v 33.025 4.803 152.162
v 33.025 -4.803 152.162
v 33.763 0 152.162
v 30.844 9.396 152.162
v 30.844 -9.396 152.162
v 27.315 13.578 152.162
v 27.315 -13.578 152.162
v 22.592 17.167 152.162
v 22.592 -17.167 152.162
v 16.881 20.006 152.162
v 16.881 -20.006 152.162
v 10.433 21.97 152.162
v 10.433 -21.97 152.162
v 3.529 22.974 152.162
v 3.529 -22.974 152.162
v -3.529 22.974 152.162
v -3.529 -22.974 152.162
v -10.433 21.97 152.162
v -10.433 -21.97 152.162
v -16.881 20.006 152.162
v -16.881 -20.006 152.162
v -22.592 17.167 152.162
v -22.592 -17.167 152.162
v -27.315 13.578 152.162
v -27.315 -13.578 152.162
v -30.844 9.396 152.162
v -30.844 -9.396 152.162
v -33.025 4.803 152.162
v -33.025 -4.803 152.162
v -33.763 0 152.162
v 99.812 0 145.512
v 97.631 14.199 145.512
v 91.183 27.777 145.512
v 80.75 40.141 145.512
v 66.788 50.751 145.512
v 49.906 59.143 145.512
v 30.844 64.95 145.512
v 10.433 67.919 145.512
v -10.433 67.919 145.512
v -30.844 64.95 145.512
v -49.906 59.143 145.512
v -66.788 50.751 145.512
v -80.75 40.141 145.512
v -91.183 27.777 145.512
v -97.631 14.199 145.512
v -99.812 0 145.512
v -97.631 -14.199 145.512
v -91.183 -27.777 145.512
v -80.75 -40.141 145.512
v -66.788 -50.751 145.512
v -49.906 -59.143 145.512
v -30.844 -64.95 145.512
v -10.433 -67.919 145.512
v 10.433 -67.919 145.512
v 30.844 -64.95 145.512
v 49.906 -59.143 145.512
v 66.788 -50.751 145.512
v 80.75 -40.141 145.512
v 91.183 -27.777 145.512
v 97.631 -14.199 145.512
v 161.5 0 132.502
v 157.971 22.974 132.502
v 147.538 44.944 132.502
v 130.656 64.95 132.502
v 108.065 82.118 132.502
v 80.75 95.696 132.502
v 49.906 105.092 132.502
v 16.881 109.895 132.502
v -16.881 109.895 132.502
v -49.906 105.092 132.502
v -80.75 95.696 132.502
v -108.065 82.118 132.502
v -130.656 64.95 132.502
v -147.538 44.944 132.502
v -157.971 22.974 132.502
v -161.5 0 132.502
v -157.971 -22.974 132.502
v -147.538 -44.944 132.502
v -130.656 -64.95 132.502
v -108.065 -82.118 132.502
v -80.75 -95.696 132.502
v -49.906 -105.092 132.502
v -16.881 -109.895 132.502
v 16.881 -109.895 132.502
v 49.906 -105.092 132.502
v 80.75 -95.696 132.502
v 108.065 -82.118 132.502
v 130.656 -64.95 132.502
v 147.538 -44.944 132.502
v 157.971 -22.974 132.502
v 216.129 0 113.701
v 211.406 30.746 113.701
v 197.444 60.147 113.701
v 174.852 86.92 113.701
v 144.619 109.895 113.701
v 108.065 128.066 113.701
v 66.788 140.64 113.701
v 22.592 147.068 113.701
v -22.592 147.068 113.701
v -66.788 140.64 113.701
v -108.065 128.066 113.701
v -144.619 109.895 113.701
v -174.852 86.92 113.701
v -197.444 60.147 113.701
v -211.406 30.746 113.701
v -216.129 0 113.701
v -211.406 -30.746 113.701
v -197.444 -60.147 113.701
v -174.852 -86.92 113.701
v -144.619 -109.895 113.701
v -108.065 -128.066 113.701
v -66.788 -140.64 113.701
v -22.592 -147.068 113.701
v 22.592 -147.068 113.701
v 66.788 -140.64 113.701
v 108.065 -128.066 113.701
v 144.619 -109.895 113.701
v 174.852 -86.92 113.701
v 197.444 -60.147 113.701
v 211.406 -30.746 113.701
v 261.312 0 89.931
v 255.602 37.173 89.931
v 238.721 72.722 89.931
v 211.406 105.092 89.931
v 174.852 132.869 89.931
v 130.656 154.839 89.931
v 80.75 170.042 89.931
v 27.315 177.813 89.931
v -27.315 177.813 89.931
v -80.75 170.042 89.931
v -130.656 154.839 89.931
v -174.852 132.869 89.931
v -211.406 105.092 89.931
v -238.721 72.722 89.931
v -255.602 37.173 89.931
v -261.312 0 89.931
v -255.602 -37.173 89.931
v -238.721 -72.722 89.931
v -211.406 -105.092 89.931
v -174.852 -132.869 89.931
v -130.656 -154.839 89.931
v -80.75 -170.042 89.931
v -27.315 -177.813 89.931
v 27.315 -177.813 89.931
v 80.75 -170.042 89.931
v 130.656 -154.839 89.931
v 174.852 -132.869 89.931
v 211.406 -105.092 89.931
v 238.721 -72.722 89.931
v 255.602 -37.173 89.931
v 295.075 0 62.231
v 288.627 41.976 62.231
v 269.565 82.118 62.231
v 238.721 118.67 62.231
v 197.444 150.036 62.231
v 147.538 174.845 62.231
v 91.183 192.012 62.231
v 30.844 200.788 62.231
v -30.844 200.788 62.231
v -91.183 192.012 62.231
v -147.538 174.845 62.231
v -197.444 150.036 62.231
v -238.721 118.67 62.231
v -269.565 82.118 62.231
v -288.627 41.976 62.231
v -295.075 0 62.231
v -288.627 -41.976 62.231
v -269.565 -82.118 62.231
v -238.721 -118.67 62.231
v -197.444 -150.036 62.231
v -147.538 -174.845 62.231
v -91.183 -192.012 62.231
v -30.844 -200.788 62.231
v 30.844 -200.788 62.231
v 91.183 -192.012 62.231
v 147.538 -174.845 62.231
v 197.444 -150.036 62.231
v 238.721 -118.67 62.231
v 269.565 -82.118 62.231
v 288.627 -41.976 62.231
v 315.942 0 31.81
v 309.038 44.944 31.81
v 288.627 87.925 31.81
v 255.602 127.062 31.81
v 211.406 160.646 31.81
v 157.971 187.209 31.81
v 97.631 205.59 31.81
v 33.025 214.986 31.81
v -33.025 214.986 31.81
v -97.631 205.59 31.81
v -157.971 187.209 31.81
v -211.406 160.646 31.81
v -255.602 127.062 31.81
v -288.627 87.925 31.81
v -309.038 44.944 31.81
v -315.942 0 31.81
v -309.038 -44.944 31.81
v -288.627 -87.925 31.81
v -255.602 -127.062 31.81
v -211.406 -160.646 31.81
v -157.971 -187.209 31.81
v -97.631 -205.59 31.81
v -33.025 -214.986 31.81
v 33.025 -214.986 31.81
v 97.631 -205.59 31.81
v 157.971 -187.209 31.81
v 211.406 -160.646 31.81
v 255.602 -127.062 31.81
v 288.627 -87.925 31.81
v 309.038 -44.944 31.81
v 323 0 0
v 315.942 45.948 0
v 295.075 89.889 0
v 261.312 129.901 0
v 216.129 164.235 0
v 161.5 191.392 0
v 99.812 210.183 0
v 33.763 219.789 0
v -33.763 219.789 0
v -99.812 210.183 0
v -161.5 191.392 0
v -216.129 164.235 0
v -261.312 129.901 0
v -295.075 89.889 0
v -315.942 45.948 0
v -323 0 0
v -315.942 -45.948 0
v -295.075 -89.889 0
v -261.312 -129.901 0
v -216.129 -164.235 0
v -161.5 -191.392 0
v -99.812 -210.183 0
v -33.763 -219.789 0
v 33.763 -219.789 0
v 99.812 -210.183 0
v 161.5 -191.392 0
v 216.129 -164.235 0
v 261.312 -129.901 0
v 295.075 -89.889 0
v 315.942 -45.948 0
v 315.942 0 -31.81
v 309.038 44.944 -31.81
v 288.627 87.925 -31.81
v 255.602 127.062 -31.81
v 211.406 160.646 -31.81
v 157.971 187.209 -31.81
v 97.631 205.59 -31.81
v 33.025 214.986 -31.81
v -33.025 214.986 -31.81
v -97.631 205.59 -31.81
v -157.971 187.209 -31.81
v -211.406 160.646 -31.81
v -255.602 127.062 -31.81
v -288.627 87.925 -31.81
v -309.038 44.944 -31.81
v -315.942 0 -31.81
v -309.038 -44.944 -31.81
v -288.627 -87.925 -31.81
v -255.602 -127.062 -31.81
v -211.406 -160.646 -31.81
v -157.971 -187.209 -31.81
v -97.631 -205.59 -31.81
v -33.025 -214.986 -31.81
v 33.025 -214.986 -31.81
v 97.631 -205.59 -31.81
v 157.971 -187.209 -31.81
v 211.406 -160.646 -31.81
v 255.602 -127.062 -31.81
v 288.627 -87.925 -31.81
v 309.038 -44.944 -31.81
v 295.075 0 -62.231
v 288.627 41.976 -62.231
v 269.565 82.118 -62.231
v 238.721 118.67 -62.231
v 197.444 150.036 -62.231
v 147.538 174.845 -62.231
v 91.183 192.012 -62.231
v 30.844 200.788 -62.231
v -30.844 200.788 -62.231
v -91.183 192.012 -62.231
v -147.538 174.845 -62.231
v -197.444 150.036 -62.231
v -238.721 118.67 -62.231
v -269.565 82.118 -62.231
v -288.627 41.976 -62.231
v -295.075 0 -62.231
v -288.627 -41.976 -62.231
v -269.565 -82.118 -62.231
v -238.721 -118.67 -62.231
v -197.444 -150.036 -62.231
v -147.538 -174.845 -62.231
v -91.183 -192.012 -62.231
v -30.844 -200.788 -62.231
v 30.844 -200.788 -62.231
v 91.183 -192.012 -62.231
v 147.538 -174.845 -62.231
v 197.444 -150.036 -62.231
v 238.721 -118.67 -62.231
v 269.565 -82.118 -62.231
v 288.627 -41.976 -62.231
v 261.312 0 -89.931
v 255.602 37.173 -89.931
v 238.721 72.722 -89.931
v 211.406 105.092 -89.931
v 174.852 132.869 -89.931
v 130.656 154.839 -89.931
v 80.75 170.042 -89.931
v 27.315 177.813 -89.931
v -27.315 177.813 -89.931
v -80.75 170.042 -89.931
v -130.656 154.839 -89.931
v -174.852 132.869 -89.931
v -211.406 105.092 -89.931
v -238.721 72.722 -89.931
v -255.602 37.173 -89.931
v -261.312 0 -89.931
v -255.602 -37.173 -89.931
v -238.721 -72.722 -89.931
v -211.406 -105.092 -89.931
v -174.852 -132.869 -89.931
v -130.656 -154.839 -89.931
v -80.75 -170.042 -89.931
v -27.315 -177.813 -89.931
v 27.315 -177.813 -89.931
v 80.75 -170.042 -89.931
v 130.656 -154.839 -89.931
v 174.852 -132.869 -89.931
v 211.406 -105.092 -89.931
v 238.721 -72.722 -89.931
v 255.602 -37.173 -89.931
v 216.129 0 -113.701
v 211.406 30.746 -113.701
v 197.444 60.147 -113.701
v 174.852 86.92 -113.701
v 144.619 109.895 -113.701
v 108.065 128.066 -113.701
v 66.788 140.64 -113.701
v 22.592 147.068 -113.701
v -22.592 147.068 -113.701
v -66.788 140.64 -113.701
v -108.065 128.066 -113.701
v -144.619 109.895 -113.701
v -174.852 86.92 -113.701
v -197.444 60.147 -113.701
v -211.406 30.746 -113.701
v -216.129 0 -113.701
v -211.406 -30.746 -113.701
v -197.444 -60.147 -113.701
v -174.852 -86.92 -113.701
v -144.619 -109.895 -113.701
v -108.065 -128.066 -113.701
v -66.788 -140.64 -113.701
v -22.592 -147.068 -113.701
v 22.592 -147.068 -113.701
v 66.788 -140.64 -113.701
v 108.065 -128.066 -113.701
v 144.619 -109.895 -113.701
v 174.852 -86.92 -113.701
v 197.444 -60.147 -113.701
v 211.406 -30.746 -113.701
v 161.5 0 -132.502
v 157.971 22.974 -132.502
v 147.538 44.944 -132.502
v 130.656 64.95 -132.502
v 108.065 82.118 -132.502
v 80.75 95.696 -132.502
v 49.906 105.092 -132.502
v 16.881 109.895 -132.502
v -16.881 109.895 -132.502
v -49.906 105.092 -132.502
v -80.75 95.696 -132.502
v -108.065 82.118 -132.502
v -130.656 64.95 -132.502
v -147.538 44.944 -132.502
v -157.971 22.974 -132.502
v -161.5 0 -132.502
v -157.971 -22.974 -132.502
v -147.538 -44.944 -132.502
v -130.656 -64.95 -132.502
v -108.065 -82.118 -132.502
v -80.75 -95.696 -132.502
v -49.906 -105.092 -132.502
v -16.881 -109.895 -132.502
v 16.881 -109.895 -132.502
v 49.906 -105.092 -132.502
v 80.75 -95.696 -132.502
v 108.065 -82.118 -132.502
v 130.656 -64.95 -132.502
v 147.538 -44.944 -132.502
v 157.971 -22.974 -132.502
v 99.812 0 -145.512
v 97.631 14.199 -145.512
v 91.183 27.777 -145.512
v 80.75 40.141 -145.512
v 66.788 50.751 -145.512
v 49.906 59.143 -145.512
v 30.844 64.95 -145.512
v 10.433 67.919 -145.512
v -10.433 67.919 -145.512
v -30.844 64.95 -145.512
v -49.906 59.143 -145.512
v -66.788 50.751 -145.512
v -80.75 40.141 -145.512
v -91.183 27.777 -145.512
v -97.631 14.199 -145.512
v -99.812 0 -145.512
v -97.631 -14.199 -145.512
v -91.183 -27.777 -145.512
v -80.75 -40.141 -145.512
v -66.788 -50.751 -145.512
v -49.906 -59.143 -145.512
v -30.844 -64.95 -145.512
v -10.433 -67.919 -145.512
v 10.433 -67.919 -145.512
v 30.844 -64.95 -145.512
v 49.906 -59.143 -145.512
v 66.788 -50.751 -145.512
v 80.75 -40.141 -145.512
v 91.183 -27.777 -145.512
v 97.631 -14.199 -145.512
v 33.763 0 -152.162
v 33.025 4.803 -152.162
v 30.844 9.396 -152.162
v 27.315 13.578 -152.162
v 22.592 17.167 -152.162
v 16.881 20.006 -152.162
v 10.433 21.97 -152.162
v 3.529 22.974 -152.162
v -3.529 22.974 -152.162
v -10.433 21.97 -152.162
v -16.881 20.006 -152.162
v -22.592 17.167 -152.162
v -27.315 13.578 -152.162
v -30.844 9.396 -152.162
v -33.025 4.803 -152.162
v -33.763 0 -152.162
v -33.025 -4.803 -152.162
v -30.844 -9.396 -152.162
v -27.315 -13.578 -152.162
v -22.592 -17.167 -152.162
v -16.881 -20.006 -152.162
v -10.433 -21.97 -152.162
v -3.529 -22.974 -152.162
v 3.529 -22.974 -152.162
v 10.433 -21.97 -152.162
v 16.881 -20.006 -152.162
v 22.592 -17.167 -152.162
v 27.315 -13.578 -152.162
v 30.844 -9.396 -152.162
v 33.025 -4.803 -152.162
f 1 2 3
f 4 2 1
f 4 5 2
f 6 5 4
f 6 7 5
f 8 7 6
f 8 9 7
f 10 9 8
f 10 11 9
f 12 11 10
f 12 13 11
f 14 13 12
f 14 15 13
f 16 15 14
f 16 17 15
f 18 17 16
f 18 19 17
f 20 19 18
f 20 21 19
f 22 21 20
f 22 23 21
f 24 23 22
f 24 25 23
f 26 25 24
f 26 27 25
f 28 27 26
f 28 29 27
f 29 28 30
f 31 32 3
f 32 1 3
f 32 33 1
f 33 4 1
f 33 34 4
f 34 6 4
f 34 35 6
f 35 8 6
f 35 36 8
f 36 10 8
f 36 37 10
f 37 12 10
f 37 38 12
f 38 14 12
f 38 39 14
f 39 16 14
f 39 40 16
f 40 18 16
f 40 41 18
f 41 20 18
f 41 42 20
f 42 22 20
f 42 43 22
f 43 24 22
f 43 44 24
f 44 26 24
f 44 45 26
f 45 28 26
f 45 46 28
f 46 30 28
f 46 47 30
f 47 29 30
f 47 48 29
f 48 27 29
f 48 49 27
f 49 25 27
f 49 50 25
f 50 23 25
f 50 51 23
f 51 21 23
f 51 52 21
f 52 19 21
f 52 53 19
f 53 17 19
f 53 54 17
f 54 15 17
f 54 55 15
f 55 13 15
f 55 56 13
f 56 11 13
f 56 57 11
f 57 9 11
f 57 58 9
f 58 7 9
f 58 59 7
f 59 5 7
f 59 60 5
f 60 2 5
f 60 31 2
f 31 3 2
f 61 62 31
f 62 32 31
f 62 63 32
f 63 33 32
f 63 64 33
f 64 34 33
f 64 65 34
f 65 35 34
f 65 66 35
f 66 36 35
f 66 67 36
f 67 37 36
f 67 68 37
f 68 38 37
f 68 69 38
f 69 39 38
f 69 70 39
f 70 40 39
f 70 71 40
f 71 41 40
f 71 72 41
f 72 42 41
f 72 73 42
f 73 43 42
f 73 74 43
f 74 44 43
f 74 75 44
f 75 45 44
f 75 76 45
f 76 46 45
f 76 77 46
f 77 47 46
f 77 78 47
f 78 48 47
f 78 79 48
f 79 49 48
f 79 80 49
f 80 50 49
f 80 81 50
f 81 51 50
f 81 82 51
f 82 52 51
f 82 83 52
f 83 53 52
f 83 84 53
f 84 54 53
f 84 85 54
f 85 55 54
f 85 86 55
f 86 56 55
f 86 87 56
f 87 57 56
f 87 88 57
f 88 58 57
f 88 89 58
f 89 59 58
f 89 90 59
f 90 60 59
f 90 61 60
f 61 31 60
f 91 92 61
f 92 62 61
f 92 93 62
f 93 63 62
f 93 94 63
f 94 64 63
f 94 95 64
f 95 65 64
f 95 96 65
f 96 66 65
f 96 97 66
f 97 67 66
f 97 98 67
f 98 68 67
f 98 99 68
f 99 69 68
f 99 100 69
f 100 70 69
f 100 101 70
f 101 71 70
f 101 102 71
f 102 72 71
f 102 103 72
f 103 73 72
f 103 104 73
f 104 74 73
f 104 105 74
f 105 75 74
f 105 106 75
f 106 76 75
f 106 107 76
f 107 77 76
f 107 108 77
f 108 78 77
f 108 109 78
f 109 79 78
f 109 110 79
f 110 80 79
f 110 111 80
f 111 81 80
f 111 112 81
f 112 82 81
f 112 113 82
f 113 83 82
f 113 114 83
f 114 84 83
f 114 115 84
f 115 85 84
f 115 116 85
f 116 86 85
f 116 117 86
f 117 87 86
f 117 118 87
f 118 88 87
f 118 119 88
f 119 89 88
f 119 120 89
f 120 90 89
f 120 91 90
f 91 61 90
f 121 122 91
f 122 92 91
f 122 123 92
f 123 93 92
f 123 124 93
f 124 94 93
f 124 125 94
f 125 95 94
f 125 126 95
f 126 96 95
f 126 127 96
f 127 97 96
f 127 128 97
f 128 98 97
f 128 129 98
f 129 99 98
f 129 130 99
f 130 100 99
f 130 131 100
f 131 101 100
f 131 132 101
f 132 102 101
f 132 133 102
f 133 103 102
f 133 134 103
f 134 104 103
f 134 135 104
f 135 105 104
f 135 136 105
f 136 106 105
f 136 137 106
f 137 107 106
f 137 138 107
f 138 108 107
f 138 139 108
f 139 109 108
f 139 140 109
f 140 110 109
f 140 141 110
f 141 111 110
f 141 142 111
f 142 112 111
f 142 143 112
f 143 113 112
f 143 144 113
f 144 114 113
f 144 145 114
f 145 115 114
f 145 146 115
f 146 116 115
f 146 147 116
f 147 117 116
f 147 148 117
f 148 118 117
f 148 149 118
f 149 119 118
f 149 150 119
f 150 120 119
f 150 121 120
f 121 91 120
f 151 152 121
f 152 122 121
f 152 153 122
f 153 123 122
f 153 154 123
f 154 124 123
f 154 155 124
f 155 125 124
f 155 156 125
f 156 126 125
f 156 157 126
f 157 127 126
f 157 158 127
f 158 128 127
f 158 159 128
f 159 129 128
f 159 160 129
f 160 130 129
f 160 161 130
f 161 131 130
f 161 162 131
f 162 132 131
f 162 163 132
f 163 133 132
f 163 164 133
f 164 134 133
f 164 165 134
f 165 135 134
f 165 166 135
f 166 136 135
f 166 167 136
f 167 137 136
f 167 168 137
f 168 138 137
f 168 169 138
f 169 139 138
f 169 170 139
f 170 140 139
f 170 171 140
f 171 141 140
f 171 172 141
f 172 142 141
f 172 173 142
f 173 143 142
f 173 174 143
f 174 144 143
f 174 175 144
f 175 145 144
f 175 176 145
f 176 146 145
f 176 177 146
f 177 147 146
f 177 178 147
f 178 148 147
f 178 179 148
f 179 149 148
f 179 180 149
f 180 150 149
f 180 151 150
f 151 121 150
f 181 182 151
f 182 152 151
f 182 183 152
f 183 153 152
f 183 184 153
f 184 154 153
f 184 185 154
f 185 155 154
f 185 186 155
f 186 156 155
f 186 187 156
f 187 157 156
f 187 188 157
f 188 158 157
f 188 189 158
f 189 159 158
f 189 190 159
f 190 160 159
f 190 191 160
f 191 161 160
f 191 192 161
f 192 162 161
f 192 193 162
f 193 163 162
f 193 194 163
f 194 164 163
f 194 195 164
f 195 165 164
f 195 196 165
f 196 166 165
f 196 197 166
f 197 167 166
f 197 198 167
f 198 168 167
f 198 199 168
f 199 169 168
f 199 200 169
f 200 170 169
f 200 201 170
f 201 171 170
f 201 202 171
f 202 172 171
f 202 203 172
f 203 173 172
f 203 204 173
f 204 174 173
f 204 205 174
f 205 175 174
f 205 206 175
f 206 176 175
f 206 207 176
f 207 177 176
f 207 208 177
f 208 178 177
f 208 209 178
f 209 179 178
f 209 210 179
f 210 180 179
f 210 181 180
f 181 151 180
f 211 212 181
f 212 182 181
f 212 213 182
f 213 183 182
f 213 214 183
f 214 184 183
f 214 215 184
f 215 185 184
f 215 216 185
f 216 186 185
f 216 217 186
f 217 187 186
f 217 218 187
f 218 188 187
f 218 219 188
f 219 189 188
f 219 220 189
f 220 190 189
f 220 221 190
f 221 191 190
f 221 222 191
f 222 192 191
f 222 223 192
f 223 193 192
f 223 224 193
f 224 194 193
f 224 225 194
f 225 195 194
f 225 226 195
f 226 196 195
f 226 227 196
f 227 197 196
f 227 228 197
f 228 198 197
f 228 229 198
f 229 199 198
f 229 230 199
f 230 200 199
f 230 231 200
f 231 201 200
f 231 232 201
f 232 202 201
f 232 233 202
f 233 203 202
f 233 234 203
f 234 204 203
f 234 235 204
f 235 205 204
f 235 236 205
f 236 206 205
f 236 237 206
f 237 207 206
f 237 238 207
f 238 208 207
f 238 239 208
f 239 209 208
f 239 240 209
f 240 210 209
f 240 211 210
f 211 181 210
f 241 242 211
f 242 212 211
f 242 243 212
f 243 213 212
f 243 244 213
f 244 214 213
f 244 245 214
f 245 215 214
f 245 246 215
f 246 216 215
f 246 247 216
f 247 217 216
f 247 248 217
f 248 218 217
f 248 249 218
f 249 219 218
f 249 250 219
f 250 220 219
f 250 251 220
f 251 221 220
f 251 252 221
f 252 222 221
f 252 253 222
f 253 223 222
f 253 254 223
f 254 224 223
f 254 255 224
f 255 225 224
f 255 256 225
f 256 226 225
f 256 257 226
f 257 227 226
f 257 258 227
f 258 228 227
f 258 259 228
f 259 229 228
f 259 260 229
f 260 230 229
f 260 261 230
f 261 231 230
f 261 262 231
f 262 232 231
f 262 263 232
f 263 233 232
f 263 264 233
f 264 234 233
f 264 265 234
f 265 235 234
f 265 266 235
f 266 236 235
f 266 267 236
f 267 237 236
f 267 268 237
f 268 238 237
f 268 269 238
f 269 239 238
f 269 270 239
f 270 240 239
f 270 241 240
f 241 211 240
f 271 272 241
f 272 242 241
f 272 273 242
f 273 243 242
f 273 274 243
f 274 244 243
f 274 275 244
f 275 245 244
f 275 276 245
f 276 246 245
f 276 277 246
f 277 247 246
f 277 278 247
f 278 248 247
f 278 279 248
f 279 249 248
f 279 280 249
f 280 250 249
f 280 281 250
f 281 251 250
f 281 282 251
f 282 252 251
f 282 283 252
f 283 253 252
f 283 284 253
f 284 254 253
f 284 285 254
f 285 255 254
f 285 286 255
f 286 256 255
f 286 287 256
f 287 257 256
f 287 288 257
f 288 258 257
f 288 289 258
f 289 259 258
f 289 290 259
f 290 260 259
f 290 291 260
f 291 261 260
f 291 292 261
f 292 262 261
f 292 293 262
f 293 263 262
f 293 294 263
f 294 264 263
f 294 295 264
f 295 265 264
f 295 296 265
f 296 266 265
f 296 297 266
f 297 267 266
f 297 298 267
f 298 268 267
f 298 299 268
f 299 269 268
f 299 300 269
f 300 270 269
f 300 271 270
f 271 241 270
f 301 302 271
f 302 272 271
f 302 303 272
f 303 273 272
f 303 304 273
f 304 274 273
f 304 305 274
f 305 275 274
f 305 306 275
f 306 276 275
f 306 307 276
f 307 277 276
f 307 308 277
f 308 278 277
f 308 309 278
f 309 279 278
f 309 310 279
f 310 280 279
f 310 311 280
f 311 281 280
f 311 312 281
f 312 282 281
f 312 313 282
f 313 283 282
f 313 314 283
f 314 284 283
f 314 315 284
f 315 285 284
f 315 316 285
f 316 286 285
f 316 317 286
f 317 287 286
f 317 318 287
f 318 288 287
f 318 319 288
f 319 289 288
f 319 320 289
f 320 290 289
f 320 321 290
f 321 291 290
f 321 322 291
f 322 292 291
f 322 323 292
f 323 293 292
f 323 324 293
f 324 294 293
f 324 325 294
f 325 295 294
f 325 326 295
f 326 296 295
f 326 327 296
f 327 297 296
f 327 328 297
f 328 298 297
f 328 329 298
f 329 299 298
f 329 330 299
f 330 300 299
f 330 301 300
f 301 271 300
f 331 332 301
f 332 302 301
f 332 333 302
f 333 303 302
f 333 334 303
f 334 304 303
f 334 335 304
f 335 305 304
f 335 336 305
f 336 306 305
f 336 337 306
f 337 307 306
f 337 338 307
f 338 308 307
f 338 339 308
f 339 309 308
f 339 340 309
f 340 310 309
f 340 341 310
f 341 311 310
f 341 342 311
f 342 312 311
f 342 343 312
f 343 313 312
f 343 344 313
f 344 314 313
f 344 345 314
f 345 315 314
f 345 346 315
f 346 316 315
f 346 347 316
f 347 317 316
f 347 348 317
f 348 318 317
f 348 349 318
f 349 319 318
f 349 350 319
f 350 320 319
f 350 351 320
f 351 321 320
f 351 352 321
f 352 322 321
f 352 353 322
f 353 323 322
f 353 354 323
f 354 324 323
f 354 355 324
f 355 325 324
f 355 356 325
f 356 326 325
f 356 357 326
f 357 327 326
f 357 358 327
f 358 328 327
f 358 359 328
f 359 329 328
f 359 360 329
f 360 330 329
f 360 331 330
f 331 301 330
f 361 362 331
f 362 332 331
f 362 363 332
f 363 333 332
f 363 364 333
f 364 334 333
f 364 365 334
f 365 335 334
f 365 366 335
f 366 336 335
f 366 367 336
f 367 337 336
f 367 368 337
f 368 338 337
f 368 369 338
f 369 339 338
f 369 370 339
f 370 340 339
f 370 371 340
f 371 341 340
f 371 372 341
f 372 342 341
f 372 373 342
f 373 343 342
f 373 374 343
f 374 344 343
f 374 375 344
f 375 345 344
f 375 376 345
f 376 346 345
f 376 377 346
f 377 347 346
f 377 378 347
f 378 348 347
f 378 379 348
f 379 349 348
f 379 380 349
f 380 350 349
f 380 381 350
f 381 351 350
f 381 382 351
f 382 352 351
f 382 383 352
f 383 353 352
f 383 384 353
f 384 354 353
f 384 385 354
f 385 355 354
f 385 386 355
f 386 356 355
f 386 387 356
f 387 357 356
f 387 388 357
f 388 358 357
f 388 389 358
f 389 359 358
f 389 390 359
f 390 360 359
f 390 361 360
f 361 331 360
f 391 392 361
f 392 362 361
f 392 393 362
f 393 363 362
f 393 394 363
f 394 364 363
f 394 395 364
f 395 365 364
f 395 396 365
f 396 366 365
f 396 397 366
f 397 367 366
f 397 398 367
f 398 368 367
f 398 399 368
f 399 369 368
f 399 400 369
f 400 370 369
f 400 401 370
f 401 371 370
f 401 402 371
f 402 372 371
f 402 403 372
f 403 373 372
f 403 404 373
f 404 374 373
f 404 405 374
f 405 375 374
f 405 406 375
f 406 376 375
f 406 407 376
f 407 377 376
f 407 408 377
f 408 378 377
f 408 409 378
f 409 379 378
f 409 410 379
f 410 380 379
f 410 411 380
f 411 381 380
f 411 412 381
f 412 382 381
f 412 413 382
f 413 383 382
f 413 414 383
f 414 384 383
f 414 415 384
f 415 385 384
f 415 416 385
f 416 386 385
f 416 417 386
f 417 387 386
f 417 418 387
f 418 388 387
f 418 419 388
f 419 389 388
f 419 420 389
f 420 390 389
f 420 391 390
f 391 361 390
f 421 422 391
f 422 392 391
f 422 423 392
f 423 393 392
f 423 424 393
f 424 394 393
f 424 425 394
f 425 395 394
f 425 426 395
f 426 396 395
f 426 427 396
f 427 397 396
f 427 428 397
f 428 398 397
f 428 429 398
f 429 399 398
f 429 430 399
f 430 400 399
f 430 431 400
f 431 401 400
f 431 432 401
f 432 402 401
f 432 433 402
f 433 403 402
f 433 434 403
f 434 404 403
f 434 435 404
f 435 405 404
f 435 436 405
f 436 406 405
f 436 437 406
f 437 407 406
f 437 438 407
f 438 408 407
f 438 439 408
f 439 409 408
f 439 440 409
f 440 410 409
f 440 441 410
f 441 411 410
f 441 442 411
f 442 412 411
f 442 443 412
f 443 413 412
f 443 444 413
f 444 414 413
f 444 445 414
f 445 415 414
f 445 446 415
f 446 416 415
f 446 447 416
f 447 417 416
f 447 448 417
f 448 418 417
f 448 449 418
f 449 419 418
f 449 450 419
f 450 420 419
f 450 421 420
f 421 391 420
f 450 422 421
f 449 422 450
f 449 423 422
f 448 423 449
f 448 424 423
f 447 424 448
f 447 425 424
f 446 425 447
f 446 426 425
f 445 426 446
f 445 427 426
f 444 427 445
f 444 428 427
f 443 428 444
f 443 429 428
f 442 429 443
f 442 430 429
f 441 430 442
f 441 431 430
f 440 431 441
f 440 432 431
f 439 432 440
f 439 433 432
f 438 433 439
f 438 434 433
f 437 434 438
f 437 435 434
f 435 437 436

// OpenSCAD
// Generated by SolidPython 1.0.1 on 2020-07-29 00:46:54


scale(v = [19, 13, 9]) {
	sphere(r = 17);
}
/***********************************************
*********      SolidPython code:      **********
************************************************
 
# import packages: SolidPython
from solid import *
from solid.utils import *
from itertools import chain, combinations, permutations


class Resize:

    def __init__(self, scad_file):
        self.scad_file = scad_file
        #self.scad_file = import_scad(scad_file)
        # cone/cylinder param:
        self.r1 = 0
        self.r2 = 0
        self.h = 0
        # rectangular prism param:
        self.w = 0
        self.l = 0
        # ellipse param:
        self.r = 0

    # import OpenScad code (file name corresponds to shape)


    # classify shape + parameters
    def assign(self, param1, param2, param3):
        if self.scad_file == 'cone.scad':
            self.r1 = param1
            self.r2 = param2
            self.h = param3
        elif self.scad_file == 'cylinder.scad':
            self.r1 = param1
            self.r2 = param2
            self.h = param3
        elif self.scad_file == 'rectangularPrism.scad':
            self.h = param1
            self.l = param2
            self.w = param3
        else:
            self.r = param1
            self.h = param2

    # resize parameters
    def iterate(self):
        x = range(3, 20, 2)
        i = 1
        if self.scad_file == 'cone.scad':
            tempList = list(permutations(x, 2))
            for temp in tempList:
                param1 = temp[0]
                param2 = temp[1]
                filepath = 'produced_scad_files/' + 'cone' + str(param1) + '_' + str(param2) + '_' + '.scad'
                scad_render_to_file(cylinder(h=param1, r1=param2, r2=0), filepath)

        elif self.scad_file == 'cylinder.scad':
            tempList = list(permutations(x, 3))
            for temp in tempList:
                param1 = temp[0]
                param2 = temp[1]
                filepath = 'produced_scad_files/' + 'cylinder' + str(param1) + '_' + str(param2) + '_' + '.scad'
                scad_render_to_file(cylinder(h=param1, r1=param2, r2=param2), filepath)

        elif self.scad_file == 'rectangularPrism.scad':
            tempList = list(permutations(x, 3))
            for temp in tempList:
                param1 = temp[0]
                param2 = temp[1]
                param3 = temp[2]
                filepath = 'produced_scad_files/' + 'rectangularPrism' + str(param1) + '_' + str(param2) + '_' + str(
                    param3) + '.scad'
                scad_render_to_file(cube(size=(param1, param2, param3)), filepath)

        elif self.scad_file == 'ellipse.scad':
            tempList = list(permutations(x, 4))
            for temp in tempList:
                param1 = temp[0]
                param2 = temp[1]
                param3 = temp[2]
                param4 = temp[3]
                filepath = 'produced_scad_files/' + 'ellipse' + str(param1) + '_' + str(param2) + '_' + str(param3) + '_' + str(param4) + '.scad'
                scad_render_to_file(scale([param1, param2, param3])(sphere(r=param4)), filepath)

    def render_to_scadfile(self):
        scad_render_to_file(scad, 'example.scad') 
 
************************************************/
